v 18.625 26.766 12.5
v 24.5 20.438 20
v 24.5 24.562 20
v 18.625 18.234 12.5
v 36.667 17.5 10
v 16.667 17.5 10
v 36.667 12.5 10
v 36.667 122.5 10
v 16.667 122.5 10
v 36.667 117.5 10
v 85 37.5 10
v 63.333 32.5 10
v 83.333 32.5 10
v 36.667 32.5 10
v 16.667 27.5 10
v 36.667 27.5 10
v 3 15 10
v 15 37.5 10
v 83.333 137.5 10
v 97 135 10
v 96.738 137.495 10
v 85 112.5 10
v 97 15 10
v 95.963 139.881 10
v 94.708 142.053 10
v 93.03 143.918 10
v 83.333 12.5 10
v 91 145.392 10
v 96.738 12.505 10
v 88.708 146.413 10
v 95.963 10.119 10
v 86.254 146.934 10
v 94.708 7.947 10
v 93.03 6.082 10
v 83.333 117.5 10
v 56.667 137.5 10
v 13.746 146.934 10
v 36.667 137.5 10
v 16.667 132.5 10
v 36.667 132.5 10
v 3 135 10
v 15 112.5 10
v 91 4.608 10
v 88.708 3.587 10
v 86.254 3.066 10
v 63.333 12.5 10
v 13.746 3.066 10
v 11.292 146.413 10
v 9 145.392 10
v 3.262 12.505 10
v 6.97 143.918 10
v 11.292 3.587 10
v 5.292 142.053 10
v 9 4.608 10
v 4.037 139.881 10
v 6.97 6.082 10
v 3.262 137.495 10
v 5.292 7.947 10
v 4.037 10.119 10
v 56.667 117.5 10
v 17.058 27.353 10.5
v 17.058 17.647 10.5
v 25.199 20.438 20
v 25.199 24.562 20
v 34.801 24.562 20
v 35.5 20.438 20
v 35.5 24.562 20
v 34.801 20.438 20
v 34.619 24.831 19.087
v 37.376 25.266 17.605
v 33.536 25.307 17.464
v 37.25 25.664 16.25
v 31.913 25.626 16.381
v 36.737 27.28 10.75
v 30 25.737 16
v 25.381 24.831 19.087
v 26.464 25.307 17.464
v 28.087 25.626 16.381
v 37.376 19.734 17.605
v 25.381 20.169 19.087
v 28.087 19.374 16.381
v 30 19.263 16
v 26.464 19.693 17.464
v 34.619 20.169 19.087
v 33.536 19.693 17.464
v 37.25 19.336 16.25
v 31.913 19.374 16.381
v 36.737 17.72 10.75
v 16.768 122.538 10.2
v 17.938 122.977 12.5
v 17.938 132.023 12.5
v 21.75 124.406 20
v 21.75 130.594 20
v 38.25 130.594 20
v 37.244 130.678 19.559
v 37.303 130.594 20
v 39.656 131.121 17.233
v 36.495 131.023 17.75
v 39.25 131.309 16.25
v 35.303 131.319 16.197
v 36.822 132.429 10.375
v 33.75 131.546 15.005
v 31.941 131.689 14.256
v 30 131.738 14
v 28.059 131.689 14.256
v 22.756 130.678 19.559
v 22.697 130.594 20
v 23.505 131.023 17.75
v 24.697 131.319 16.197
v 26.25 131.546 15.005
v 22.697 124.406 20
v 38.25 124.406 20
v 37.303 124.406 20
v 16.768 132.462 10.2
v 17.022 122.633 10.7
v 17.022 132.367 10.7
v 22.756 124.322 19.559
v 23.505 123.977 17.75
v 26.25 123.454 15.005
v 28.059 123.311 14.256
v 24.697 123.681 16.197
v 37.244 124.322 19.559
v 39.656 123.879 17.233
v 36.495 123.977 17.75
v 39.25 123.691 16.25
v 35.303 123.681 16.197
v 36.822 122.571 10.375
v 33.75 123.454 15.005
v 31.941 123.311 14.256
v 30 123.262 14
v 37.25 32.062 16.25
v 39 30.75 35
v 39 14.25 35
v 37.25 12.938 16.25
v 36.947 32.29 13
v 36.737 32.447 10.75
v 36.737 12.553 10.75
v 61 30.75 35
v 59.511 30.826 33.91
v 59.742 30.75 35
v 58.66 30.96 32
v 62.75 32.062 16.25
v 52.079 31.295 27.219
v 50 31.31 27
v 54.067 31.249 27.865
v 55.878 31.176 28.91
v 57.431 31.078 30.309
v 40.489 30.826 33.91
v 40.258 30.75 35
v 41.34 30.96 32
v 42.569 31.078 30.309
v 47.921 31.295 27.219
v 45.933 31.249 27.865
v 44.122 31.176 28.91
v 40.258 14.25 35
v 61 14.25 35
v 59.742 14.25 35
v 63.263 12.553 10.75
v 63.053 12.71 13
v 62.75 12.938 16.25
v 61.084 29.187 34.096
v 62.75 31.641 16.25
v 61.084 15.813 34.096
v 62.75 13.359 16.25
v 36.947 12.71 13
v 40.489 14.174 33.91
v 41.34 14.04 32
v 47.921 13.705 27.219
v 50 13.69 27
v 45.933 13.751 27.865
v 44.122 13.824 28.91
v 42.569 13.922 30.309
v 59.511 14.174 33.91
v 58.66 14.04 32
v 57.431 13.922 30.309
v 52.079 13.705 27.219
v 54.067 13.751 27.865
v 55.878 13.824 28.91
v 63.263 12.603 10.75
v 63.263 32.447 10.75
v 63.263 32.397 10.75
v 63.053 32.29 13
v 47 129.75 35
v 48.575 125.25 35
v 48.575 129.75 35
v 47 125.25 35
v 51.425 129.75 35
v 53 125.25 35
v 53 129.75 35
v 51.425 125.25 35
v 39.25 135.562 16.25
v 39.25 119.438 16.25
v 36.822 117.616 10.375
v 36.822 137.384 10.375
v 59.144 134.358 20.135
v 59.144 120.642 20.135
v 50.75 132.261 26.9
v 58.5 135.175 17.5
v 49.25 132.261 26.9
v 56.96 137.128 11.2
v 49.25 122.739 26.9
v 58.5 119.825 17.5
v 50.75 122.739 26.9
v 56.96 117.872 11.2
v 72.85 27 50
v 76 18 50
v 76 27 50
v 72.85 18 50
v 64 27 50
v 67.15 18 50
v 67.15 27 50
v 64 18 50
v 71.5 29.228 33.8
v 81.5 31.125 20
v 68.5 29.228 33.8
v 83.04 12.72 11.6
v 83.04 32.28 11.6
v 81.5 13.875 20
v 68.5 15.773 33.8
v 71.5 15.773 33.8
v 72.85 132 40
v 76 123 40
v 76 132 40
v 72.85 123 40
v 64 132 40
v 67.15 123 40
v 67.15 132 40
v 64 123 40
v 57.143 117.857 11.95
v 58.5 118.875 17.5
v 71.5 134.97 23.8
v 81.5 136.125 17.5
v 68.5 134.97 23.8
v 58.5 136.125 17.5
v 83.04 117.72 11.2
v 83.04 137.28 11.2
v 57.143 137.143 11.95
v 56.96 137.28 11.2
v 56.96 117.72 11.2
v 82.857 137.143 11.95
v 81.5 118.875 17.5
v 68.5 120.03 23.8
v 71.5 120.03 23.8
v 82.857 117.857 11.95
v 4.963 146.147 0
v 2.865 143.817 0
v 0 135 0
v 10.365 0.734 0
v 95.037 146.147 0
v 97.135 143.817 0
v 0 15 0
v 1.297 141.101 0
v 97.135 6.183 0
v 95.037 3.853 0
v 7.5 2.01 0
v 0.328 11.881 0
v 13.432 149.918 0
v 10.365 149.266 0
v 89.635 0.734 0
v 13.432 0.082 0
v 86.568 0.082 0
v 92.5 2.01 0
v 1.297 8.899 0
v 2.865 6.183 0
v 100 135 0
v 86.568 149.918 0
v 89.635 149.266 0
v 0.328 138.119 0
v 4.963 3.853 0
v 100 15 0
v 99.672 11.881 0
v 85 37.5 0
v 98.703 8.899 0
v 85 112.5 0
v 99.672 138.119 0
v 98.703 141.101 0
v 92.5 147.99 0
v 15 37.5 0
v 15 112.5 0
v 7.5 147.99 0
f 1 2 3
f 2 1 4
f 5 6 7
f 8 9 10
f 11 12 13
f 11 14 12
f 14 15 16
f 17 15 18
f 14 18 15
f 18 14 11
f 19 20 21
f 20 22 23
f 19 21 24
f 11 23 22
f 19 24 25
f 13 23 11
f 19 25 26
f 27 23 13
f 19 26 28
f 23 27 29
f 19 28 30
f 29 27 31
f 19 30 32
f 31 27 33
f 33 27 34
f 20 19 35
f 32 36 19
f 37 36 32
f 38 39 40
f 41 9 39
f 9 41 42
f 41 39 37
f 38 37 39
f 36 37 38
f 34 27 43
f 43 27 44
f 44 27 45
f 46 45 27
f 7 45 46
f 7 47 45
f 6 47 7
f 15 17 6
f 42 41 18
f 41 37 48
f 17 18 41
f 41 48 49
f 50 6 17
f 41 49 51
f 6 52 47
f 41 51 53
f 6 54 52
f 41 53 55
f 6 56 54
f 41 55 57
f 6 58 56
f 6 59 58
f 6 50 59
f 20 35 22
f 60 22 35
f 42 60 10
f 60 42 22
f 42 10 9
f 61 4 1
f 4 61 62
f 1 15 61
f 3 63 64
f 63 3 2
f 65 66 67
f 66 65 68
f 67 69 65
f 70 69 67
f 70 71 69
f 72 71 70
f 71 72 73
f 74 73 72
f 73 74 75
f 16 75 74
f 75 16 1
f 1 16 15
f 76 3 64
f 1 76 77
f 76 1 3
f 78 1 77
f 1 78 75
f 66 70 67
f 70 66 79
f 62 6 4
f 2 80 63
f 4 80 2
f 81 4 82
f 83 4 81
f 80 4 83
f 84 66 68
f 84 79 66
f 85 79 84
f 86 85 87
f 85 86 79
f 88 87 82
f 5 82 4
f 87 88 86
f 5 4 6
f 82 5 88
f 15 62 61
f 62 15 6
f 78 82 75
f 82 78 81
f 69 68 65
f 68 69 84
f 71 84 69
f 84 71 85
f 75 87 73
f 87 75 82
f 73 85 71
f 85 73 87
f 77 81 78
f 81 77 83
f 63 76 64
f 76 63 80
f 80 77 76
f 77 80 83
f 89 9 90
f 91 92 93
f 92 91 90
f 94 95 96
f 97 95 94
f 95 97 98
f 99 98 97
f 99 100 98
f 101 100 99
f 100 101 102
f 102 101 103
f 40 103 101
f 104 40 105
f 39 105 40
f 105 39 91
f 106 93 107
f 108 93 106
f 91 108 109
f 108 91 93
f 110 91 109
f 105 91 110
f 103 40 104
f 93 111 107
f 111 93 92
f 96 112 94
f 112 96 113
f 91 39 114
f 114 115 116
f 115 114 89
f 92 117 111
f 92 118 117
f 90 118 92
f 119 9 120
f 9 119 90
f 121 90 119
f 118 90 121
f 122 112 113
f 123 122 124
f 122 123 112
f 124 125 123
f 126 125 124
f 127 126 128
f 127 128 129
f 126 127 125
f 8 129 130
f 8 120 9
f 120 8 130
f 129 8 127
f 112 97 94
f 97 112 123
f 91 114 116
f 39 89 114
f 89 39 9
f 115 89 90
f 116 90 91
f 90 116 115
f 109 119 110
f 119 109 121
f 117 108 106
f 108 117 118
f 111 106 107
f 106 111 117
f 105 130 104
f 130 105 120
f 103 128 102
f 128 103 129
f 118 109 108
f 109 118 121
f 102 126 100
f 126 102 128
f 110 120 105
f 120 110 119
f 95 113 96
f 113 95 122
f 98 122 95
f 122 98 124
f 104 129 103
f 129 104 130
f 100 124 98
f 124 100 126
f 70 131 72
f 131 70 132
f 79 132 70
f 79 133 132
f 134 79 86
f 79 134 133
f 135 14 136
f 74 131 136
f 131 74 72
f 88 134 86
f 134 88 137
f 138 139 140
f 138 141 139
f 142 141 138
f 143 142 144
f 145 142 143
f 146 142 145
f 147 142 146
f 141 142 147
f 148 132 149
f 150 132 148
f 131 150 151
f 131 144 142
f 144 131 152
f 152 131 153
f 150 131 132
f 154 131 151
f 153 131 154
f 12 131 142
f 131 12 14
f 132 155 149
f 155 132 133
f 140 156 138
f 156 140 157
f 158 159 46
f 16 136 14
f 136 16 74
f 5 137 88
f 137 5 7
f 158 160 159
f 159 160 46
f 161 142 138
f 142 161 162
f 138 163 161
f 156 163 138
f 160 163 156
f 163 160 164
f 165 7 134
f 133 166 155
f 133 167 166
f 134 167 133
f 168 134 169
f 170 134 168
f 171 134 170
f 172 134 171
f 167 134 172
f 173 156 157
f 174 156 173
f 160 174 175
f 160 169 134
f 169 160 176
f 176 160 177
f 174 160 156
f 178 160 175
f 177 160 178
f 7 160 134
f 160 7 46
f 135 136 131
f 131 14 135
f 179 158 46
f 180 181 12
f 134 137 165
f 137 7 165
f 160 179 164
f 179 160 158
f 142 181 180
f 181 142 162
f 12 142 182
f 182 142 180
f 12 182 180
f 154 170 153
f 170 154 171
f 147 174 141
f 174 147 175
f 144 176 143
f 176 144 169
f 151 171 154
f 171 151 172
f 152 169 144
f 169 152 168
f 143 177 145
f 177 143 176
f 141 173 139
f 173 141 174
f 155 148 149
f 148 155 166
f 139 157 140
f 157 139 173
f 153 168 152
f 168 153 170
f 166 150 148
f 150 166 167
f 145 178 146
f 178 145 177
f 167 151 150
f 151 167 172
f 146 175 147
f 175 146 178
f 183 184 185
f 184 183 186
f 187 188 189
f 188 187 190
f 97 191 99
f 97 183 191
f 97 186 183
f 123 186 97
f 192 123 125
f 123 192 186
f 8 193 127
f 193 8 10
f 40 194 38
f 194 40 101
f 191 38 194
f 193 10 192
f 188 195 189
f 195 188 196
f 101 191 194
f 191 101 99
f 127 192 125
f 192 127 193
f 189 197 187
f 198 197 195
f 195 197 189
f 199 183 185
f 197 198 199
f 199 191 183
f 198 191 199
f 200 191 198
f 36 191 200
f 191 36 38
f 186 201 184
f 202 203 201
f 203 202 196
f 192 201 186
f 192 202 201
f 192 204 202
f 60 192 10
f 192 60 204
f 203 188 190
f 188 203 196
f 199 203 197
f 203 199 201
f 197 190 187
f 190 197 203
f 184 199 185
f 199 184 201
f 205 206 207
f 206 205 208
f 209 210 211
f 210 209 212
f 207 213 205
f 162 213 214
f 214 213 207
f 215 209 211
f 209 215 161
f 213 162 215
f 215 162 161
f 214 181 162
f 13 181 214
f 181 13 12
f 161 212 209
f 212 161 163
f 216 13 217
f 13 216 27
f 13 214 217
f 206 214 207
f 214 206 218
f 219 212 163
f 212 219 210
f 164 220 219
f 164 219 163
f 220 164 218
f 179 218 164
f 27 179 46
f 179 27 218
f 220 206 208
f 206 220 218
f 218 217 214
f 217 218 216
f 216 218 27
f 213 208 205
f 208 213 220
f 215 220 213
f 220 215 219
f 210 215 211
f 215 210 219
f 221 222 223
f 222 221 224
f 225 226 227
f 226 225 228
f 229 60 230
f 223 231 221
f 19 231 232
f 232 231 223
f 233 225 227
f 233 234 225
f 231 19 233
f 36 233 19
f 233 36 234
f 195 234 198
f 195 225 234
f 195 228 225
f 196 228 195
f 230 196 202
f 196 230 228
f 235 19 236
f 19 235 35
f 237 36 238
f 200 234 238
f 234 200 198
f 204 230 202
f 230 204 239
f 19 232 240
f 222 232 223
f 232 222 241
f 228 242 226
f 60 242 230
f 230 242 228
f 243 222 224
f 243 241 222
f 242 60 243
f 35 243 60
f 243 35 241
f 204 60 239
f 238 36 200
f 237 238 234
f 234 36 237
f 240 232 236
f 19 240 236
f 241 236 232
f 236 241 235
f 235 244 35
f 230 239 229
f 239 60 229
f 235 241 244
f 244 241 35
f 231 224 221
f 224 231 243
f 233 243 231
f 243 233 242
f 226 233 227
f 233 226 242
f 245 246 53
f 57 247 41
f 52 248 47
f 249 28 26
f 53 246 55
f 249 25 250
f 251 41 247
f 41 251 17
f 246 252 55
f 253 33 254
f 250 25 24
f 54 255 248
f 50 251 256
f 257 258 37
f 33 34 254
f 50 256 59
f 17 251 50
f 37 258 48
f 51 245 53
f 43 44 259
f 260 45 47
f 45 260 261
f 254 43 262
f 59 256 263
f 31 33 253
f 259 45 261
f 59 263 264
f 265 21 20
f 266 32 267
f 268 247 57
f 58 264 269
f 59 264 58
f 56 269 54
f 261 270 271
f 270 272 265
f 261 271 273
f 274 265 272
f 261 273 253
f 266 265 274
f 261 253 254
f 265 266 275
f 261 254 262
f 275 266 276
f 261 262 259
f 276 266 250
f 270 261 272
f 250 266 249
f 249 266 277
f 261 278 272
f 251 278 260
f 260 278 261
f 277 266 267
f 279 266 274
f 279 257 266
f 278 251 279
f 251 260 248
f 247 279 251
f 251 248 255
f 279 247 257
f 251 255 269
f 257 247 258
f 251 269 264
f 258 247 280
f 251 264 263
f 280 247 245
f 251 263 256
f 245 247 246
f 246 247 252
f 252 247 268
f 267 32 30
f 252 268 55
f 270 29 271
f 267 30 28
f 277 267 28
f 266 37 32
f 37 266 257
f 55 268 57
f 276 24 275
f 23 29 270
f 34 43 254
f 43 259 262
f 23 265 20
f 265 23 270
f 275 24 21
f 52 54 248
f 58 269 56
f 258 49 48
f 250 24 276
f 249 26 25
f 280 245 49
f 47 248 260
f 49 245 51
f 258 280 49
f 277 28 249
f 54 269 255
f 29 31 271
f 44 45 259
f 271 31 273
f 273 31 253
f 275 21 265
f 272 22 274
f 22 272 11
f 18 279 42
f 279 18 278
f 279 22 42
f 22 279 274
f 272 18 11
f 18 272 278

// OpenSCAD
/*
--------------------------------------------------------------------------------
The Nick Shabazz Parametric Knife Display Stand (dmccaffrey fork)
Originally created by Nick Shabazz - 2024
--------------------------------------------------------------------------------
*/

/*
Introduction
--------------------------------------------------------------------------------
This file is written in the OpenSCAD language and should be opened in OpenSCAD
for editing or to render a result.
- https://openscad.org/
- https://en.wikibooks.org/wiki/OpenSCAD_User_Manual/The_OpenSCAD_Language

To get started simply modify the holder and base configuration to your liking.
Holder properties are specified as vectors so that any number of objects can
be supported in any ordering.


Note: All distance values are specified in millimeters.
--------------------------------------------------------------------------------
*/


/*
Holder Configuration
--------------------------------------------------------------------------------
- Objects can currently be of type "pen", "knife" (blade and hanlde), or "sword" (blade and blade)
- Show side may be "right" or left"
- Heigh offset specifies the staggering in height between holders
- Depth offset specifies the stagging in depth (front to back) between holders
- Width species with width (righ to left) of each holder
- Held dimensinons specify the left and right handle/pen or blade cutout diameter
- Drop height specifies the difference between the 'handle' side and non-hanlde side
*/
objects             = ["pen", "knife", "sword"];
showSide            = "right";
holderHeightOffset  = [0, 15, 15];
holderDepthOffset   = [0, 20, 20];
holderWidth         = [10, 20, 20];
heldDimensions      = [ [15, 10], [3, 20], [6, 6] ];
dropHeight          = [0, 0, 10];
//------------------------------------------------------------------------------

/*
Base Configuration
--------------------------------------------------------------------------------
*/
splitBase           = false;    // Set to true to print separate holder pieces
openBase            = true;     // Set to true to print the base with a cutout between the holders
baseTaperPercent    = 20;       // The percentage of taper (bottom to top) for the base
basePerimiter       = 15;       // The perimeter radius of the base
baseHeight          = 8;        // Hight of the base
baseWidth           = 150;      // Width of the base
//------------------------------------------------------------------------------


/*
Derived Configuration
--------------------------------------------------------------------------------
*/
baseLength = Sum(holderDepthOffset) + basePerimiter * 4;
echo("Base length: ", baseLength);

supportLength=(0.8 * baseLength) / len(objects);
echo("Support length: ", supportLength);

supportPosOffset = 0.15;
leftHolderPos = supportPosOffset * baseWidth;
rightHolderPos = (1 - supportPosOffset) * baseWidth;
echo("Handle positions: left=", leftHolderPos, "right=", rightHolderPos);
//------------------------------------------------------------------------------

/*
Rendering
--------------------------------------------------------------------------------
*/
union(){
    baseHeight = 10;
    for (i = [0:len(objects)-1]){
        offset = Sum(holderDepthOffset, i) + basePerimiter * 2;
        holderHeight = Sum(holderHeightOffset, i) + 10;
        dropSideHeight = holderHeight - dropHeight[i];
        echo("Generating holder: num=", i, "offset=", offset, "baseHeight=", baseHeight, "dropSideHeight=", dropSideHeight);
        
        showSidePos = (showSide == "right") ? rightHolderPos : leftHolderPos;
        otherSidePos = (showSide == "right") ? leftHolderPos : rightHolderPos;
        
        if(objects[i] == "sword") {
            translate([offset, otherSidePos, baseHeight])
                rotate([0, 0, 0])
                bladeholder(supportLength, holderWidth[i], holderHeight, heldDimensions[i][0]*3, heldDimensions[i][0], heldDimensions[i][1]);
            
        } else {
            translate([offset, otherSidePos, baseHeight])
                rotate([0, 0, 90])
                handleholder(supportLength, holderWidth[i], holderHeight, heldDimensions[i][1]);
        }
        
        if(objects[i] == "knife" || objects[i] == "sword") {
            translate([offset, showSidePos, baseHeight])
                rotate([0, 0, 0])
                bladeholder(supportLength, holderWidth[i], dropSideHeight, heldDimensions[i][0]*3, heldDimensions[i][0], heldDimensions[i][1]);
            
        } else {
            translate([offset, showSidePos, baseHeight])
                rotate([0, 0, 90])
                handleholder(supportLength, holderWidth[i], dropSideHeight, heldDimensions[i][0]);
        }
    };
    basePerimWithTaper = basePerimiter - basePerimiter * (baseTaperPercent/100);
    if(splitBase) {
        baseshapesplithulls(baseLength, baseWidth, baseHieght, basePerimiter, basePerimWithTaper);
        
    } else {
        baseshapehull(baseLength, baseWidth, baseHeight, basePerimiter, basePerimWithTaper);
    }
};
//------------------------------------------------------------------------------

//Sum the elements of a vector between zero and the end.
function SubSum(vec, i, end)=vec[i]+((i == end) ? 0 : SubSum(vec, i+1, end));
function Sum(vec, end=-1) = (end == -1) ? SubSum(vec, 0, len(vec)-1) : SubSum(vec, 0, end);

// This creates the base with rounded edges
module baseshapehull(length, width, thiccness, hullrad1, hullrad2) {
    difference() {
    hull(){
        // Creates a hull around four tapered cylinders
        translate([hullrad1,hullrad1,0]){
            cylinder(thiccness,hullrad1,hullrad2);
        };
        translate([length-hullrad1,width-hullrad1,0]){
            cylinder(thiccness,hullrad1,hullrad2);
        };
        translate([hullrad1,width-hullrad1,0]){
            cylinder(thiccness,hullrad1,hullrad2);
        };
        translate([length-hullrad1,hullrad1,0]){
            cylinder(thiccness,hullrad1,hullrad2);
        };
        translate([length-hullrad1,hullrad1+10,0]){
            cylinder(thiccness,hullrad1,hullrad2);
        };
    };
    if(openBase) {
        translate([length*0.15,baseWidth*0.25,-10]) {
            cube([length*0.7, baseWidth*0.5, 100]);
        };
     }
 };};
 
// This creates a separate base with rounded edges for the blade and hanlde sides
module baseshapesplithulls(length, width, thiccness, hullrad1, hullrad2) {
    // Creates a hull around  tapered cylinders for the blade holders
    hull(){
        translate([hullrad1,bladepos+hullrad1,0]){
            cylinder(thiccness,hullrad1,hullrad2);
        };
        translate([hullrad1,bladepos-hullrad1,0]){
            cylinder(thiccness,hullrad1,hullrad2);
        };
        translate([length-hullrad1,bladepos+hullrad1,0]){
            cylinder(thiccness,hullrad1,hullrad2);
        };
        translate([length-hullrad1,bladepos-hullrad1,0]){
            cylinder(thiccness,hullrad1,hullrad2);
        };
    };
    // Creates a hull around  tapered cylinders for the hanlde holders
    hull(){
        translate([length-hullrad1,handlepos+hullrad1,0]){
            cylinder(thiccness,hullrad1,hullrad2);
        };
        translate([hullrad1,handlepos-hullrad1,0]){
            cylinder(thiccness,hullrad1,hullrad2);
        };
        translate([length-hullrad1,handlepos-hullrad1,0]){
            cylinder(thiccness,hullrad1,hullrad2);
        };
        translate([hullrad1,handlepos+hullrad1,0]){
            cylinder(thiccness,hullrad1,hullrad2);
        };
    }
 };
 
// This creates a holder with a round cutout for handles           
module handleholder(supportlength, supportwidth, height, handlediameter) {
    toplength=(handlediameter*1.1);
    taperpercent=toplength/supportlength;
    difference() {
        linear_extrude(height = height, twist = 0, scale = taperpercent, slices = 200)
            square([supportwidth,supportlength], center=true);
        
        translate([0,0,height+0.1*handlediameter])
            rotate([0,90,0])
            cylinder(h=100,d=handlediameter, center=true);
    }
}

// This creates a holder with a notched cutout for blades
module bladeholder(supportlength, supportwidth, height, bladenotchdepth,bladenotchwidth, handlediameter) {
    toplength=(bladenotchwidth*2);
    taperpercent=toplength/supportlength;

    difference() {
        linear_extrude(height = height, twist = 0, scale = taperpercent, slices = 200)
            square([supportlength, supportwidth], center=true);
        
        translate([0,0,height+0.1*bladenotchdepth])
            rotate([0,180,0])
            linear_extrude(height = bladenotchdepth, twist = 0, scale = 0.5, slices = 200)
            square([bladenotchwidth,1000], center=true);
    }
}
